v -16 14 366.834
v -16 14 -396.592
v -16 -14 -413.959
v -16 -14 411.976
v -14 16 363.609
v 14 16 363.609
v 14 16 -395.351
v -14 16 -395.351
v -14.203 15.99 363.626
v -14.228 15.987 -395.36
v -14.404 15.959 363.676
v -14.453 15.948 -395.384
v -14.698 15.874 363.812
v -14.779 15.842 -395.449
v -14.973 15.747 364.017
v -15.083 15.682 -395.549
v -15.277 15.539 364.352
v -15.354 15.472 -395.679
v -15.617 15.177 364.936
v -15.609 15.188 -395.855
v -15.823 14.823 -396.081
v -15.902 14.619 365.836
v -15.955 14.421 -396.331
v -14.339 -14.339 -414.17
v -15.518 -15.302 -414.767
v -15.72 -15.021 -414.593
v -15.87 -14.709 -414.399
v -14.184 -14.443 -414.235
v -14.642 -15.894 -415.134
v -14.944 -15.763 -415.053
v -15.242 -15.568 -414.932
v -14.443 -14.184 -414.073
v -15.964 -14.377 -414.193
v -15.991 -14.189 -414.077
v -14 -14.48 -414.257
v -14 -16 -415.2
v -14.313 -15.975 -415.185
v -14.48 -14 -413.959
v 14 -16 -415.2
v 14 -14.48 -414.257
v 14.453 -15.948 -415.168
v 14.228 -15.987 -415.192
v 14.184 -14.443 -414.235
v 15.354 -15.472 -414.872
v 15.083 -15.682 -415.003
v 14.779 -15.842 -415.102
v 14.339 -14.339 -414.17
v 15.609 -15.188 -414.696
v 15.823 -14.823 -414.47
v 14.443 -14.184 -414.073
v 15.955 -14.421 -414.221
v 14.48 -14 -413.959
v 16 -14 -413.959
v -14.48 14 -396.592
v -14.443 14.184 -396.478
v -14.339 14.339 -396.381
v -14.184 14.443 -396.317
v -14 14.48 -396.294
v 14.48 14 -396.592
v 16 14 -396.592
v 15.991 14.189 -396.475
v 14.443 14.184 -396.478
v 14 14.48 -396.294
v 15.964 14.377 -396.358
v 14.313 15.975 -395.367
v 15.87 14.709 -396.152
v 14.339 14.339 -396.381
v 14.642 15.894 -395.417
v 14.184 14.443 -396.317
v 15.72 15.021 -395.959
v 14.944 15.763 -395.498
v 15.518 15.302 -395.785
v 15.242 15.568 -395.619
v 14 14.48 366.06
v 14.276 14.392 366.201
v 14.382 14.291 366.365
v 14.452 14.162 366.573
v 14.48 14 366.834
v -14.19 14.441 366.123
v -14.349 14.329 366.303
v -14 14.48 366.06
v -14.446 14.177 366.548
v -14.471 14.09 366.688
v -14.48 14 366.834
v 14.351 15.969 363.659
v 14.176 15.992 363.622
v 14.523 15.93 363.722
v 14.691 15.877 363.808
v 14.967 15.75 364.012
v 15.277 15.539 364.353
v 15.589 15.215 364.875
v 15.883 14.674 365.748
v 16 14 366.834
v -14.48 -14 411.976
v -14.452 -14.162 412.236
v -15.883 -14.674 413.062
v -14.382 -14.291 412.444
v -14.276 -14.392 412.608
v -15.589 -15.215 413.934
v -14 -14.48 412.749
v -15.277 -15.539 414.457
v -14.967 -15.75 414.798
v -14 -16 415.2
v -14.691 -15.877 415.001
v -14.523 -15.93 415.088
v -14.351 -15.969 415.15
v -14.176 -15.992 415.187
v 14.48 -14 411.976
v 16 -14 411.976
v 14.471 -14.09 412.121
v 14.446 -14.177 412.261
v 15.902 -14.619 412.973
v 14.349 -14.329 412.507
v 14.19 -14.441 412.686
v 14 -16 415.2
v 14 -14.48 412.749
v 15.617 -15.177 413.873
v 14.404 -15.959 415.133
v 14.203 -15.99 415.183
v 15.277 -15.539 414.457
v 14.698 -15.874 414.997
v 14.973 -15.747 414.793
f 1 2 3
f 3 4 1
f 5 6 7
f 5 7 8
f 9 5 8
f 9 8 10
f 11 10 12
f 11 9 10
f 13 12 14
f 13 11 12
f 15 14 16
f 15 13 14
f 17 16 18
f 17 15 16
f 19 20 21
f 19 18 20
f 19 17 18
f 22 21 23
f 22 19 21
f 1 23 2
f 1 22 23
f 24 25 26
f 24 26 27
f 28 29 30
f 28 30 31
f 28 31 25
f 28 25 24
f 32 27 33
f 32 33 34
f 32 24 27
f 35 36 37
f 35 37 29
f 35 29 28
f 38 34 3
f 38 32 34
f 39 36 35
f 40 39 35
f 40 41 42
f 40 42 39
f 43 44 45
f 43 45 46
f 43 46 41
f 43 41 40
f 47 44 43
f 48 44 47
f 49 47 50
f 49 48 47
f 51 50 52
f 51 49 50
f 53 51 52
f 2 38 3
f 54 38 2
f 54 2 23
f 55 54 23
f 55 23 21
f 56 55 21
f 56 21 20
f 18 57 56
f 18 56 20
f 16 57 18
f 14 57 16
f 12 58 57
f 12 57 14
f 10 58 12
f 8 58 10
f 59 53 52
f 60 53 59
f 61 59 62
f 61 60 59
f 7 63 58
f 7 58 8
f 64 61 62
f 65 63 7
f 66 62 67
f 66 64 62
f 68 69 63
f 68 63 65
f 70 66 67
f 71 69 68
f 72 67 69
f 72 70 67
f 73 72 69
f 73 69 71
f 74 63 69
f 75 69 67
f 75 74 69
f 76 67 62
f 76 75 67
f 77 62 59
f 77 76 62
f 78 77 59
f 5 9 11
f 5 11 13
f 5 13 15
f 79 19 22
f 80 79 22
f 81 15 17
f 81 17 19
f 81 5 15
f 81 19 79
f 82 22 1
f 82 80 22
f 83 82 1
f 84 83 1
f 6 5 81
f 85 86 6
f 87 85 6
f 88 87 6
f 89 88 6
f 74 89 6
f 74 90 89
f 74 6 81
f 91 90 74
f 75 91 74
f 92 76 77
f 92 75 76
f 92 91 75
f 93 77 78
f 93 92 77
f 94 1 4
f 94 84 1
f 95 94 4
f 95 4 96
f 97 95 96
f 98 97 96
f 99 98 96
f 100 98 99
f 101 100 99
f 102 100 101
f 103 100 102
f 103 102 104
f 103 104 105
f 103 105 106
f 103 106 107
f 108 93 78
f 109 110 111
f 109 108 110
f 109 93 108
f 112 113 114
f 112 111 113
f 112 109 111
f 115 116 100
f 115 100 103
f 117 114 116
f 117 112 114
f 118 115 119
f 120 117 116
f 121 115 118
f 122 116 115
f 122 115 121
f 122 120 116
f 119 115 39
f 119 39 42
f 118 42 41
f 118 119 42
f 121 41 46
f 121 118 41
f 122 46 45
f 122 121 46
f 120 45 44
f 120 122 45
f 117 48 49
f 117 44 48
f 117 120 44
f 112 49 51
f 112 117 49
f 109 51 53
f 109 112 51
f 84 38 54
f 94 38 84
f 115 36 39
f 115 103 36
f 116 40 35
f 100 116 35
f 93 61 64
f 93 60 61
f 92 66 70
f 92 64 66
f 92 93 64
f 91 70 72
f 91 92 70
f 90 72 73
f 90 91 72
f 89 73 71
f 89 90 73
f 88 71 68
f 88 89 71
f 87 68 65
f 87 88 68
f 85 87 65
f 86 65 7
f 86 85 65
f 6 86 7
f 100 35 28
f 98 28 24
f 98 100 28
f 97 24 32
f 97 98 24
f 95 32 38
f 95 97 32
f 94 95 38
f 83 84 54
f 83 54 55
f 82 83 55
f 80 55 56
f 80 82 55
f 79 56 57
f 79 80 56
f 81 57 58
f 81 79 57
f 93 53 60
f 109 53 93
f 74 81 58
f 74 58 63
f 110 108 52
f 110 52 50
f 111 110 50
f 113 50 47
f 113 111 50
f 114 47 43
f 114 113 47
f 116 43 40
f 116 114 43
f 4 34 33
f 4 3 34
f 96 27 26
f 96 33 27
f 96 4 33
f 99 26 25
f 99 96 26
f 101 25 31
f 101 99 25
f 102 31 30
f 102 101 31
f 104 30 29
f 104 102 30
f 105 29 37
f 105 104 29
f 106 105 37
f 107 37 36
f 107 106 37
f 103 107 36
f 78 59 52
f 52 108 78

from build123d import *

# Parameters (mm, degrees)
BOSS_EXTRUDE1_DEPTH      = 415.2
BOSS_EXTRUDE1_DEPTH_BACK = 415.2
CUT_EXTRUDE1_DEPTH       = 417.738575128
CUT_EXTRUDE2_DEPTH       = 417.738575128


with BuildPart() as part:
    # Sketch1 → Boss-Extrude1 (new, two sides: drawn at the far end of the back side and taken through both)
    with BuildSketch(Plane.XY.offset(-BOSS_EXTRUDE1_DEPTH_BACK)):
        with BuildLine():
            Line((-14, -16), (14, -16))
            ThreePointArc((14, -16), (15.414213562, -15.414213562), (16, -14))
            Line((16, -14), (16, 14))
            ThreePointArc((16, 14), (15.414213562, 15.414213562), (14, 16))
            Line((14, 16), (-14, 16))
            ThreePointArc((-14, 16), (-15.414213562, 15.414213562), (-16, 14))
            Line((-16, 14), (-16, -14))
            ThreePointArc((-16, -14), (-15.414213562, -15.414213562), (-14, -16))
        make_face()
        with BuildLine():
            Line((-14, 14.48), (14, 14.48))
            ThreePointArc((14, 14.48), (14.339411255, 14.339411255), (14.48, 14))
            Line((14.48, 14), (14.48, -14))
            ThreePointArc((14.48, -14), (14.339411255, -14.339411255), (14, -14.48))
            Line((14, -14.48), (-14, -14.48))
            ThreePointArc((-14, -14.48), (-14.339411255, -14.339411255), (-14.48, -14))
            Line((-14.48, -14), (-14.48, 14))
            ThreePointArc((-14.48, 14), (-14.339411255, 14.339411255), (-14, 14.48))
        make_face(mode=Mode.SUBTRACT)
    extrude(amount=BOSS_EXTRUDE1_DEPTH + BOSS_EXTRUDE1_DEPTH_BACK)

    # Sketch2 → Cut-Extrude1 (cut, through all)
    with BuildSketch(Plane(origin=(16, 0, 0), x_dir=(0, 0, -1), z_dir=(1, 0, 0))):
        Polygon((-415.2, -16), (-415.2, 16), (-363.609390927, 16), align=None)
    extrude(amount=-CUT_EXTRUDE1_DEPTH, mode=Mode.SUBTRACT)

    # Sketch3 → Cut-Extrude2 (cut, through all)
    with BuildSketch(Plane(origin=(16, 0, 0), x_dir=(0, 0, -1), z_dir=(1, 0, 0))):
        Polygon((415.2, 16), (415.2, -16), (395.351426424, 16), align=None)
    extrude(amount=-CUT_EXTRUDE2_DEPTH, mode=Mode.SUBTRACT)


solid = part.part
